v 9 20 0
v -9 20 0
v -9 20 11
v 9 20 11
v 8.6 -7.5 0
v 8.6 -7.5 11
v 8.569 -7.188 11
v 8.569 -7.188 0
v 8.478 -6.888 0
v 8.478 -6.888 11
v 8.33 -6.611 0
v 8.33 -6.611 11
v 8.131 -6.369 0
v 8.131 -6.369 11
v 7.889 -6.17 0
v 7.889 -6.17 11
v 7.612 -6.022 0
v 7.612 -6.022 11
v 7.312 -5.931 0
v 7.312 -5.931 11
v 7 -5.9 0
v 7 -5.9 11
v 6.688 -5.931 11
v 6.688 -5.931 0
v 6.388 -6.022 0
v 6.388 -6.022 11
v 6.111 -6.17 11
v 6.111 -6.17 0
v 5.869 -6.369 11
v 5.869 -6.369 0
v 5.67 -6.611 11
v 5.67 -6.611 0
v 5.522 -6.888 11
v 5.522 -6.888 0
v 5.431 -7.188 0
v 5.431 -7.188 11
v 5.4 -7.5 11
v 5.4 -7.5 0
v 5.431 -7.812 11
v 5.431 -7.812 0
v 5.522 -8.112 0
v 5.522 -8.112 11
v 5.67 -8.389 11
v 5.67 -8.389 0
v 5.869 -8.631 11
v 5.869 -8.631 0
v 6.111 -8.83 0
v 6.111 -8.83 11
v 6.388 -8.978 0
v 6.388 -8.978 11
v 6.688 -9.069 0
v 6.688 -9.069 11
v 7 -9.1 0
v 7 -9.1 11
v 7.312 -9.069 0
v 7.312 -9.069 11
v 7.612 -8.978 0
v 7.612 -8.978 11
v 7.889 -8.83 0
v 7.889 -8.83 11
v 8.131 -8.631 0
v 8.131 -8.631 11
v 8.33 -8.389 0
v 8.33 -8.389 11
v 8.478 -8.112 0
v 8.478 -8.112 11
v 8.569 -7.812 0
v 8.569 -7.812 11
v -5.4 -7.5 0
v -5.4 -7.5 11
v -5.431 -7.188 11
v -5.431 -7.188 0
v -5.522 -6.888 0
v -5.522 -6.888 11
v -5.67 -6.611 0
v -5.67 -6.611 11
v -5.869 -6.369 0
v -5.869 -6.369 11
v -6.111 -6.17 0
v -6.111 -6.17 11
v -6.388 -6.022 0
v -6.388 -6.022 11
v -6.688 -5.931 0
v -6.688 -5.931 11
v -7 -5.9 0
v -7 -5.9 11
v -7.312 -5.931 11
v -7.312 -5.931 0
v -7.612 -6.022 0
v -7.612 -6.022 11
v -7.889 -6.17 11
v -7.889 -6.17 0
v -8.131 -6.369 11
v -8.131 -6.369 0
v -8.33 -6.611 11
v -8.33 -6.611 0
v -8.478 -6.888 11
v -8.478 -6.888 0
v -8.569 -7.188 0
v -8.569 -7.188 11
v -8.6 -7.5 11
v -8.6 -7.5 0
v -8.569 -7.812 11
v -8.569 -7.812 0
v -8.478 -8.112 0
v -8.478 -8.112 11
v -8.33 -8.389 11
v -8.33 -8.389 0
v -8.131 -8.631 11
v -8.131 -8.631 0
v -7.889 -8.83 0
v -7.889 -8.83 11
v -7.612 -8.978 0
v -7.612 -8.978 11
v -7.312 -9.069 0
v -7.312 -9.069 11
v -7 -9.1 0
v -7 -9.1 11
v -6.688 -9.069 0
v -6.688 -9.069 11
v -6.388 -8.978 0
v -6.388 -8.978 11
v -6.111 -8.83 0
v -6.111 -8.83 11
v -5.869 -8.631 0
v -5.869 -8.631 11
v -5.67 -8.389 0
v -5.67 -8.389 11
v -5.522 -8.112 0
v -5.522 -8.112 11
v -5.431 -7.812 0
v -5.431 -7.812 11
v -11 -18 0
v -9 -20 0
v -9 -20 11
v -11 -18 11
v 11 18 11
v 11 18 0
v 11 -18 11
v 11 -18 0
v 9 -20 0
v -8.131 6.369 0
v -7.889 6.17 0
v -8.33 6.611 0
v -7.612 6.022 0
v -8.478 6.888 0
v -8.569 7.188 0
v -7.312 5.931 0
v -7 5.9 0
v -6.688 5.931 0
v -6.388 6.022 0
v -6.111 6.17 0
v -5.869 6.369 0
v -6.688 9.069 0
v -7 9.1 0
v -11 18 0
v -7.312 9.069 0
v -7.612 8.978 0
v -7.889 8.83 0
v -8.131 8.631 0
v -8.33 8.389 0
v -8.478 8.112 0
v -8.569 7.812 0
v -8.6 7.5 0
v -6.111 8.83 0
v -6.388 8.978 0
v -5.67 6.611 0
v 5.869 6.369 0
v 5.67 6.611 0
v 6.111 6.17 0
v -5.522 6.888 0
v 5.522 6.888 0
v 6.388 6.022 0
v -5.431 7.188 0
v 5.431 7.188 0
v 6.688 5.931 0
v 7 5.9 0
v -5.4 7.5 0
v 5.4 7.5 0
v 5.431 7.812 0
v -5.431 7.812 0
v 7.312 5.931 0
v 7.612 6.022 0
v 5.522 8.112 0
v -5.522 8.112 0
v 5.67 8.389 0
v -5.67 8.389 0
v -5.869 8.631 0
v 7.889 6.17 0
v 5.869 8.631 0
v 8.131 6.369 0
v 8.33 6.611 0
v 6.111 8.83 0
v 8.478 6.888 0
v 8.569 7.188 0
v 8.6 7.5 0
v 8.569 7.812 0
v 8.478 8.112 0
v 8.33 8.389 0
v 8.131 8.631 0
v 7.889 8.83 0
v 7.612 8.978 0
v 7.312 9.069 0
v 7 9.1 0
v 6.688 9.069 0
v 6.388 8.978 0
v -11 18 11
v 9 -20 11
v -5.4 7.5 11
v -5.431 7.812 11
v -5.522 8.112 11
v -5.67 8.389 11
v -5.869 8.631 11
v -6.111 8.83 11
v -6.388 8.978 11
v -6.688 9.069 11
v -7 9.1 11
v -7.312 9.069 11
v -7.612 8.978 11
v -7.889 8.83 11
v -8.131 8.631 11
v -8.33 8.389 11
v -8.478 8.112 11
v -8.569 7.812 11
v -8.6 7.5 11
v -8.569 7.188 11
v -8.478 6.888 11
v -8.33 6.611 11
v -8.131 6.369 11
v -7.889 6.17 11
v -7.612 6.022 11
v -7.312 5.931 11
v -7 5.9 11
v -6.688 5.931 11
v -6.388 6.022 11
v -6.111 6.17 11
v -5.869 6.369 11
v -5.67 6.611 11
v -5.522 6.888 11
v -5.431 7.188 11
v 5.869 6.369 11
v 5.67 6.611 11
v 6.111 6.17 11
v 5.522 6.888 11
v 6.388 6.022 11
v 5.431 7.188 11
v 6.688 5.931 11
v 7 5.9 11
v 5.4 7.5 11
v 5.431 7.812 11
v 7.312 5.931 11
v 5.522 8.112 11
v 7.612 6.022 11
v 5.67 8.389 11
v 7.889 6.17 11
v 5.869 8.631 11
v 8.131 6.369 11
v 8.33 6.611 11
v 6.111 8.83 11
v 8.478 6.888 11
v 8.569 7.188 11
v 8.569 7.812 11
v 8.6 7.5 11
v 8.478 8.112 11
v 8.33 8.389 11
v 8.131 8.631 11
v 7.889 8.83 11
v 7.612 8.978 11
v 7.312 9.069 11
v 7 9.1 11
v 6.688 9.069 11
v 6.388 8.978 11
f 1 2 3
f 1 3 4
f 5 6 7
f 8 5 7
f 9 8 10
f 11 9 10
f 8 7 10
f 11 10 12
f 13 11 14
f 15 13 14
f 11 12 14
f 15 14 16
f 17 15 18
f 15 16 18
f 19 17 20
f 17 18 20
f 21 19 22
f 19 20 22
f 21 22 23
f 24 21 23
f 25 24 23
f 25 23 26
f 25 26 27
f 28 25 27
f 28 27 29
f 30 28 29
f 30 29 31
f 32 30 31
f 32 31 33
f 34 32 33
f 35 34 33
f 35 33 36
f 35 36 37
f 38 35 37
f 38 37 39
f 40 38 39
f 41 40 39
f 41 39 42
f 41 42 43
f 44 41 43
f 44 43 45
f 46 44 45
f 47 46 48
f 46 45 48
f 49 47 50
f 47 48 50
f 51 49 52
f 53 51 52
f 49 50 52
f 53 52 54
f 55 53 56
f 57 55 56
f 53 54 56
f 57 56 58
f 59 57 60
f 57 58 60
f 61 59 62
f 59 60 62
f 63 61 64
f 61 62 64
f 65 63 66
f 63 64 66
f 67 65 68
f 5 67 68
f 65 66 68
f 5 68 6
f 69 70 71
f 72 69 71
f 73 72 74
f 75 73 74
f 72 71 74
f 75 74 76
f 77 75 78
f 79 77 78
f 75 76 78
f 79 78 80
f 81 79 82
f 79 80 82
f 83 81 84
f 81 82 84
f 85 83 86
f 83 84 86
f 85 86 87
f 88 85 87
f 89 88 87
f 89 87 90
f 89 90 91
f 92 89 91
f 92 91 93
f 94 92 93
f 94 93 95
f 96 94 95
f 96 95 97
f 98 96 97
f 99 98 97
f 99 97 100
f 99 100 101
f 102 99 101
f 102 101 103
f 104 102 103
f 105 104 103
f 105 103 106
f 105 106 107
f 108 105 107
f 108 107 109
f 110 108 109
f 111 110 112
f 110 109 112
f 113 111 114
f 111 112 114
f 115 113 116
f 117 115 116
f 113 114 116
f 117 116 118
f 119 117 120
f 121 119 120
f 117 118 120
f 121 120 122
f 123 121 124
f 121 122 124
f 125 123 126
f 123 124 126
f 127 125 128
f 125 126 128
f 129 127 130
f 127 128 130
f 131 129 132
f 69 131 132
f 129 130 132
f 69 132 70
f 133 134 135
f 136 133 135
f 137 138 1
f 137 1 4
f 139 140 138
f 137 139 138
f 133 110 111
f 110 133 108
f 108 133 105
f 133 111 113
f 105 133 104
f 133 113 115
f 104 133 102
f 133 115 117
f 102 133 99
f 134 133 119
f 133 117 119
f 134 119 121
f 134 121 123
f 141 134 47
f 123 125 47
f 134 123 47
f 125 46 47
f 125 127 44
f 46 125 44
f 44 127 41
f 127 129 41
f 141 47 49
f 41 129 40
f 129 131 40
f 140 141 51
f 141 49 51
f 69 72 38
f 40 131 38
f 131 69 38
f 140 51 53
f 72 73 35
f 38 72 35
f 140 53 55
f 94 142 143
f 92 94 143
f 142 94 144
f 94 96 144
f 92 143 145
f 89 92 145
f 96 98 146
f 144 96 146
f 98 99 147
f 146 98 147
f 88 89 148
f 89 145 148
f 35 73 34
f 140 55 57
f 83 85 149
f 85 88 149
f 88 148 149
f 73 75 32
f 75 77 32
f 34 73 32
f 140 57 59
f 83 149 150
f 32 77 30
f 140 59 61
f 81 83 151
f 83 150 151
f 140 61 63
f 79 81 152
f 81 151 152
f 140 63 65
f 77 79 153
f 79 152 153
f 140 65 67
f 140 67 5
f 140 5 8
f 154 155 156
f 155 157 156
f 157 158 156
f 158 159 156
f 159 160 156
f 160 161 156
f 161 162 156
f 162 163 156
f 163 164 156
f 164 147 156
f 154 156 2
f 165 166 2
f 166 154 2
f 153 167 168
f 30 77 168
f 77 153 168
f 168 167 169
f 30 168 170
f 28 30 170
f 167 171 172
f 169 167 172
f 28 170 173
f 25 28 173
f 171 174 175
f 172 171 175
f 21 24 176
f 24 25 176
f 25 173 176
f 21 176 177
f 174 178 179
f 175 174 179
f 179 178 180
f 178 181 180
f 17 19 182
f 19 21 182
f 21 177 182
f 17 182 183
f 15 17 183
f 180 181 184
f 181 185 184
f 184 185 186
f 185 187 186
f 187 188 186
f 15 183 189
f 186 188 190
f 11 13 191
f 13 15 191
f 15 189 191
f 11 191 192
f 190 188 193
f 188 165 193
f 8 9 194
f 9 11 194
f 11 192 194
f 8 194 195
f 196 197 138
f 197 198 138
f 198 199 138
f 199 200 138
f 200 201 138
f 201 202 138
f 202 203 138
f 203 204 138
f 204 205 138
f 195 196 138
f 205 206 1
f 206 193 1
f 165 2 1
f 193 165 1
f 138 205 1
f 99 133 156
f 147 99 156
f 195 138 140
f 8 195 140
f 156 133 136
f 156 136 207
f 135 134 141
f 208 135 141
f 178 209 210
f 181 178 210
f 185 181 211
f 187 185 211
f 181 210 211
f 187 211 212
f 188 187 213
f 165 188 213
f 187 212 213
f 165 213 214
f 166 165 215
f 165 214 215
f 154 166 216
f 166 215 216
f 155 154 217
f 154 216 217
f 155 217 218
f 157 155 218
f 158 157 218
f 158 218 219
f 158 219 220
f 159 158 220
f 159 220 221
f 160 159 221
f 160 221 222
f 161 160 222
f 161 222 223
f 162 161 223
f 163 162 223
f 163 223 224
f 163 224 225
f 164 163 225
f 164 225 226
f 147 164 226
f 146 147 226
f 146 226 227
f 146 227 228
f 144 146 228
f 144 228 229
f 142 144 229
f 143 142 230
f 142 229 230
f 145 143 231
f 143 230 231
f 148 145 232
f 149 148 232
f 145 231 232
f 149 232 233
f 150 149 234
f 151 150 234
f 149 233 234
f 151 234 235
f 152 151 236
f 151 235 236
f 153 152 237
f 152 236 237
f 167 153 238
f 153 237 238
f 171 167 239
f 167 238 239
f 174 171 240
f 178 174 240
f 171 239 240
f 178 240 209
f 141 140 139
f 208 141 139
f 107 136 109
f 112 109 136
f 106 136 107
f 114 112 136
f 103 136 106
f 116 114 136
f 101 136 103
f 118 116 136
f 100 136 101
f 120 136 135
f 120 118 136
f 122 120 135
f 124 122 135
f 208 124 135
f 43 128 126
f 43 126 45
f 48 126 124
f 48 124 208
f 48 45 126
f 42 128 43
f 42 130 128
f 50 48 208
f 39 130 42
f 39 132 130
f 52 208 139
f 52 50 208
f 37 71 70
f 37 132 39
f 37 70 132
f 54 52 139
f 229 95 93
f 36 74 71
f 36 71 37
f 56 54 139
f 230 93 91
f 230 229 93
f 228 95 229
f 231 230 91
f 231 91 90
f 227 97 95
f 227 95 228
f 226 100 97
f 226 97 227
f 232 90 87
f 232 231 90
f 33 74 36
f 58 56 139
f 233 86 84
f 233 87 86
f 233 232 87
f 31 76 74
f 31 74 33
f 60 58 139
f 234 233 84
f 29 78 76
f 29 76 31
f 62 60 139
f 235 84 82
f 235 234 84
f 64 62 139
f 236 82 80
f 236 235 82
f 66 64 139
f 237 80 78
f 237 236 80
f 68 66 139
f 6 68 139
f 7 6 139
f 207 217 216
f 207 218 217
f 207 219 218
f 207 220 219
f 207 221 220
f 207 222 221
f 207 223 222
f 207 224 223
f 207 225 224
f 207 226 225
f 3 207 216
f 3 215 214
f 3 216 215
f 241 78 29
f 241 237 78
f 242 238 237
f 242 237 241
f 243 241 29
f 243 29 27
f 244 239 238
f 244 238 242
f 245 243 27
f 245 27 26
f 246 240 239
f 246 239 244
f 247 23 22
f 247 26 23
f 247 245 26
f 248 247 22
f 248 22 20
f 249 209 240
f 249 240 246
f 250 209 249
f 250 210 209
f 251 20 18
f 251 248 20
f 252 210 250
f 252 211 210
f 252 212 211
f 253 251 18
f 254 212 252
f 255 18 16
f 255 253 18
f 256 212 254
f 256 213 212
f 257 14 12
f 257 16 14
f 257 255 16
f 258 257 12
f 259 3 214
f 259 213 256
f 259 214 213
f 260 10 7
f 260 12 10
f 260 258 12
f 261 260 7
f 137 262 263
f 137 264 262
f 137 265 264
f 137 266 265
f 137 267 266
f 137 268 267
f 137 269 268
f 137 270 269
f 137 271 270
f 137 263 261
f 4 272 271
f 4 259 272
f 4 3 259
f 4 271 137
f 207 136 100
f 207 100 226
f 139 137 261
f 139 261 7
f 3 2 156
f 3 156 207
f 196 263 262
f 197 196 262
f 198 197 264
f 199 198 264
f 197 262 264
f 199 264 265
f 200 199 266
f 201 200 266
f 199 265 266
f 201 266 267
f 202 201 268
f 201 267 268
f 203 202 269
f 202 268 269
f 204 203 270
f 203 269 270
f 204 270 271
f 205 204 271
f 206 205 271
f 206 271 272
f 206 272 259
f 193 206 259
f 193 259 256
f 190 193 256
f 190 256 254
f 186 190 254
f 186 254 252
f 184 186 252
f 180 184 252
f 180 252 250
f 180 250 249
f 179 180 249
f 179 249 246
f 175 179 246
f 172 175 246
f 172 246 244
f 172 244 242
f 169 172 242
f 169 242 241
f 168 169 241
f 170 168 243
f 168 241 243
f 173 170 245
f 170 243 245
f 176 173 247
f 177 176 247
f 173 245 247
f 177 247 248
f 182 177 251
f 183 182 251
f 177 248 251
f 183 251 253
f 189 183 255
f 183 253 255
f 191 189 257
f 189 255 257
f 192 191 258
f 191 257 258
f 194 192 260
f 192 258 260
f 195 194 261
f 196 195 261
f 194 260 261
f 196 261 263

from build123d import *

# Parameters (mm, degrees)
SKETCH_1_W                  = 22
SKETCH_1_H                  = 40
EXTRUDE_1_DEPTH             = 11
SKETCH_4_R                  = 1.6
CUT_EXTRUDE_3_DEPTH         = 12
PATTERN_LINEAR_1_COUNT      = 2
PATTERN_LINEAR_1_PITCH      = 14
PATTERN_LINEAR_1_COUNT_DIR2 = 2
PATTERN_LINEAR_1_PITCH_DIR2 = 15
CHAMFER_1_SIZE              = 2


with BuildPart() as part:
    # 草圖1 → 填料-伸長1 (new body)
    with BuildSketch(Plane.XY):
        Rectangle(SKETCH_1_W, SKETCH_1_H)
    extrude(amount=EXTRUDE_1_DEPTH)

    # 草圖4 → 除料-伸長3 (cut, through all)
    with BuildSketch(Plane.XY.offset(11)):
        with Locations((-7, 7.5)):
            Circle(SKETCH_4_R)
    cut_extrude_3 = extrude(amount=-CUT_EXTRUDE_3_DEPTH, mode=Mode.SUBTRACT)

    # 直線複製排列1: Cut-Extrude 3 2 × 2
    with Locations(*[(i * PATTERN_LINEAR_1_PITCH, -j * PATTERN_LINEAR_1_PITCH_DIR2, 0) for i in range(PATTERN_LINEAR_1_COUNT) for j in range(PATTERN_LINEAR_1_COUNT_DIR2) if (i, j) != (0, 0)]):
        add(cut_extrude_3, mode=Mode.SUBTRACT)

    # 導角1
    chamfer_1_edges = [part.edges().sort_by_distance(p)[0] for p in [
        (11, -20, 5.5),
        (-11, -20, 5.5),
        (-11, 20, 5.5),
        (11, 20, 5.5),
    ]]
    chamfer(chamfer_1_edges, length=CHAMFER_1_SIZE)


solid = part.part
